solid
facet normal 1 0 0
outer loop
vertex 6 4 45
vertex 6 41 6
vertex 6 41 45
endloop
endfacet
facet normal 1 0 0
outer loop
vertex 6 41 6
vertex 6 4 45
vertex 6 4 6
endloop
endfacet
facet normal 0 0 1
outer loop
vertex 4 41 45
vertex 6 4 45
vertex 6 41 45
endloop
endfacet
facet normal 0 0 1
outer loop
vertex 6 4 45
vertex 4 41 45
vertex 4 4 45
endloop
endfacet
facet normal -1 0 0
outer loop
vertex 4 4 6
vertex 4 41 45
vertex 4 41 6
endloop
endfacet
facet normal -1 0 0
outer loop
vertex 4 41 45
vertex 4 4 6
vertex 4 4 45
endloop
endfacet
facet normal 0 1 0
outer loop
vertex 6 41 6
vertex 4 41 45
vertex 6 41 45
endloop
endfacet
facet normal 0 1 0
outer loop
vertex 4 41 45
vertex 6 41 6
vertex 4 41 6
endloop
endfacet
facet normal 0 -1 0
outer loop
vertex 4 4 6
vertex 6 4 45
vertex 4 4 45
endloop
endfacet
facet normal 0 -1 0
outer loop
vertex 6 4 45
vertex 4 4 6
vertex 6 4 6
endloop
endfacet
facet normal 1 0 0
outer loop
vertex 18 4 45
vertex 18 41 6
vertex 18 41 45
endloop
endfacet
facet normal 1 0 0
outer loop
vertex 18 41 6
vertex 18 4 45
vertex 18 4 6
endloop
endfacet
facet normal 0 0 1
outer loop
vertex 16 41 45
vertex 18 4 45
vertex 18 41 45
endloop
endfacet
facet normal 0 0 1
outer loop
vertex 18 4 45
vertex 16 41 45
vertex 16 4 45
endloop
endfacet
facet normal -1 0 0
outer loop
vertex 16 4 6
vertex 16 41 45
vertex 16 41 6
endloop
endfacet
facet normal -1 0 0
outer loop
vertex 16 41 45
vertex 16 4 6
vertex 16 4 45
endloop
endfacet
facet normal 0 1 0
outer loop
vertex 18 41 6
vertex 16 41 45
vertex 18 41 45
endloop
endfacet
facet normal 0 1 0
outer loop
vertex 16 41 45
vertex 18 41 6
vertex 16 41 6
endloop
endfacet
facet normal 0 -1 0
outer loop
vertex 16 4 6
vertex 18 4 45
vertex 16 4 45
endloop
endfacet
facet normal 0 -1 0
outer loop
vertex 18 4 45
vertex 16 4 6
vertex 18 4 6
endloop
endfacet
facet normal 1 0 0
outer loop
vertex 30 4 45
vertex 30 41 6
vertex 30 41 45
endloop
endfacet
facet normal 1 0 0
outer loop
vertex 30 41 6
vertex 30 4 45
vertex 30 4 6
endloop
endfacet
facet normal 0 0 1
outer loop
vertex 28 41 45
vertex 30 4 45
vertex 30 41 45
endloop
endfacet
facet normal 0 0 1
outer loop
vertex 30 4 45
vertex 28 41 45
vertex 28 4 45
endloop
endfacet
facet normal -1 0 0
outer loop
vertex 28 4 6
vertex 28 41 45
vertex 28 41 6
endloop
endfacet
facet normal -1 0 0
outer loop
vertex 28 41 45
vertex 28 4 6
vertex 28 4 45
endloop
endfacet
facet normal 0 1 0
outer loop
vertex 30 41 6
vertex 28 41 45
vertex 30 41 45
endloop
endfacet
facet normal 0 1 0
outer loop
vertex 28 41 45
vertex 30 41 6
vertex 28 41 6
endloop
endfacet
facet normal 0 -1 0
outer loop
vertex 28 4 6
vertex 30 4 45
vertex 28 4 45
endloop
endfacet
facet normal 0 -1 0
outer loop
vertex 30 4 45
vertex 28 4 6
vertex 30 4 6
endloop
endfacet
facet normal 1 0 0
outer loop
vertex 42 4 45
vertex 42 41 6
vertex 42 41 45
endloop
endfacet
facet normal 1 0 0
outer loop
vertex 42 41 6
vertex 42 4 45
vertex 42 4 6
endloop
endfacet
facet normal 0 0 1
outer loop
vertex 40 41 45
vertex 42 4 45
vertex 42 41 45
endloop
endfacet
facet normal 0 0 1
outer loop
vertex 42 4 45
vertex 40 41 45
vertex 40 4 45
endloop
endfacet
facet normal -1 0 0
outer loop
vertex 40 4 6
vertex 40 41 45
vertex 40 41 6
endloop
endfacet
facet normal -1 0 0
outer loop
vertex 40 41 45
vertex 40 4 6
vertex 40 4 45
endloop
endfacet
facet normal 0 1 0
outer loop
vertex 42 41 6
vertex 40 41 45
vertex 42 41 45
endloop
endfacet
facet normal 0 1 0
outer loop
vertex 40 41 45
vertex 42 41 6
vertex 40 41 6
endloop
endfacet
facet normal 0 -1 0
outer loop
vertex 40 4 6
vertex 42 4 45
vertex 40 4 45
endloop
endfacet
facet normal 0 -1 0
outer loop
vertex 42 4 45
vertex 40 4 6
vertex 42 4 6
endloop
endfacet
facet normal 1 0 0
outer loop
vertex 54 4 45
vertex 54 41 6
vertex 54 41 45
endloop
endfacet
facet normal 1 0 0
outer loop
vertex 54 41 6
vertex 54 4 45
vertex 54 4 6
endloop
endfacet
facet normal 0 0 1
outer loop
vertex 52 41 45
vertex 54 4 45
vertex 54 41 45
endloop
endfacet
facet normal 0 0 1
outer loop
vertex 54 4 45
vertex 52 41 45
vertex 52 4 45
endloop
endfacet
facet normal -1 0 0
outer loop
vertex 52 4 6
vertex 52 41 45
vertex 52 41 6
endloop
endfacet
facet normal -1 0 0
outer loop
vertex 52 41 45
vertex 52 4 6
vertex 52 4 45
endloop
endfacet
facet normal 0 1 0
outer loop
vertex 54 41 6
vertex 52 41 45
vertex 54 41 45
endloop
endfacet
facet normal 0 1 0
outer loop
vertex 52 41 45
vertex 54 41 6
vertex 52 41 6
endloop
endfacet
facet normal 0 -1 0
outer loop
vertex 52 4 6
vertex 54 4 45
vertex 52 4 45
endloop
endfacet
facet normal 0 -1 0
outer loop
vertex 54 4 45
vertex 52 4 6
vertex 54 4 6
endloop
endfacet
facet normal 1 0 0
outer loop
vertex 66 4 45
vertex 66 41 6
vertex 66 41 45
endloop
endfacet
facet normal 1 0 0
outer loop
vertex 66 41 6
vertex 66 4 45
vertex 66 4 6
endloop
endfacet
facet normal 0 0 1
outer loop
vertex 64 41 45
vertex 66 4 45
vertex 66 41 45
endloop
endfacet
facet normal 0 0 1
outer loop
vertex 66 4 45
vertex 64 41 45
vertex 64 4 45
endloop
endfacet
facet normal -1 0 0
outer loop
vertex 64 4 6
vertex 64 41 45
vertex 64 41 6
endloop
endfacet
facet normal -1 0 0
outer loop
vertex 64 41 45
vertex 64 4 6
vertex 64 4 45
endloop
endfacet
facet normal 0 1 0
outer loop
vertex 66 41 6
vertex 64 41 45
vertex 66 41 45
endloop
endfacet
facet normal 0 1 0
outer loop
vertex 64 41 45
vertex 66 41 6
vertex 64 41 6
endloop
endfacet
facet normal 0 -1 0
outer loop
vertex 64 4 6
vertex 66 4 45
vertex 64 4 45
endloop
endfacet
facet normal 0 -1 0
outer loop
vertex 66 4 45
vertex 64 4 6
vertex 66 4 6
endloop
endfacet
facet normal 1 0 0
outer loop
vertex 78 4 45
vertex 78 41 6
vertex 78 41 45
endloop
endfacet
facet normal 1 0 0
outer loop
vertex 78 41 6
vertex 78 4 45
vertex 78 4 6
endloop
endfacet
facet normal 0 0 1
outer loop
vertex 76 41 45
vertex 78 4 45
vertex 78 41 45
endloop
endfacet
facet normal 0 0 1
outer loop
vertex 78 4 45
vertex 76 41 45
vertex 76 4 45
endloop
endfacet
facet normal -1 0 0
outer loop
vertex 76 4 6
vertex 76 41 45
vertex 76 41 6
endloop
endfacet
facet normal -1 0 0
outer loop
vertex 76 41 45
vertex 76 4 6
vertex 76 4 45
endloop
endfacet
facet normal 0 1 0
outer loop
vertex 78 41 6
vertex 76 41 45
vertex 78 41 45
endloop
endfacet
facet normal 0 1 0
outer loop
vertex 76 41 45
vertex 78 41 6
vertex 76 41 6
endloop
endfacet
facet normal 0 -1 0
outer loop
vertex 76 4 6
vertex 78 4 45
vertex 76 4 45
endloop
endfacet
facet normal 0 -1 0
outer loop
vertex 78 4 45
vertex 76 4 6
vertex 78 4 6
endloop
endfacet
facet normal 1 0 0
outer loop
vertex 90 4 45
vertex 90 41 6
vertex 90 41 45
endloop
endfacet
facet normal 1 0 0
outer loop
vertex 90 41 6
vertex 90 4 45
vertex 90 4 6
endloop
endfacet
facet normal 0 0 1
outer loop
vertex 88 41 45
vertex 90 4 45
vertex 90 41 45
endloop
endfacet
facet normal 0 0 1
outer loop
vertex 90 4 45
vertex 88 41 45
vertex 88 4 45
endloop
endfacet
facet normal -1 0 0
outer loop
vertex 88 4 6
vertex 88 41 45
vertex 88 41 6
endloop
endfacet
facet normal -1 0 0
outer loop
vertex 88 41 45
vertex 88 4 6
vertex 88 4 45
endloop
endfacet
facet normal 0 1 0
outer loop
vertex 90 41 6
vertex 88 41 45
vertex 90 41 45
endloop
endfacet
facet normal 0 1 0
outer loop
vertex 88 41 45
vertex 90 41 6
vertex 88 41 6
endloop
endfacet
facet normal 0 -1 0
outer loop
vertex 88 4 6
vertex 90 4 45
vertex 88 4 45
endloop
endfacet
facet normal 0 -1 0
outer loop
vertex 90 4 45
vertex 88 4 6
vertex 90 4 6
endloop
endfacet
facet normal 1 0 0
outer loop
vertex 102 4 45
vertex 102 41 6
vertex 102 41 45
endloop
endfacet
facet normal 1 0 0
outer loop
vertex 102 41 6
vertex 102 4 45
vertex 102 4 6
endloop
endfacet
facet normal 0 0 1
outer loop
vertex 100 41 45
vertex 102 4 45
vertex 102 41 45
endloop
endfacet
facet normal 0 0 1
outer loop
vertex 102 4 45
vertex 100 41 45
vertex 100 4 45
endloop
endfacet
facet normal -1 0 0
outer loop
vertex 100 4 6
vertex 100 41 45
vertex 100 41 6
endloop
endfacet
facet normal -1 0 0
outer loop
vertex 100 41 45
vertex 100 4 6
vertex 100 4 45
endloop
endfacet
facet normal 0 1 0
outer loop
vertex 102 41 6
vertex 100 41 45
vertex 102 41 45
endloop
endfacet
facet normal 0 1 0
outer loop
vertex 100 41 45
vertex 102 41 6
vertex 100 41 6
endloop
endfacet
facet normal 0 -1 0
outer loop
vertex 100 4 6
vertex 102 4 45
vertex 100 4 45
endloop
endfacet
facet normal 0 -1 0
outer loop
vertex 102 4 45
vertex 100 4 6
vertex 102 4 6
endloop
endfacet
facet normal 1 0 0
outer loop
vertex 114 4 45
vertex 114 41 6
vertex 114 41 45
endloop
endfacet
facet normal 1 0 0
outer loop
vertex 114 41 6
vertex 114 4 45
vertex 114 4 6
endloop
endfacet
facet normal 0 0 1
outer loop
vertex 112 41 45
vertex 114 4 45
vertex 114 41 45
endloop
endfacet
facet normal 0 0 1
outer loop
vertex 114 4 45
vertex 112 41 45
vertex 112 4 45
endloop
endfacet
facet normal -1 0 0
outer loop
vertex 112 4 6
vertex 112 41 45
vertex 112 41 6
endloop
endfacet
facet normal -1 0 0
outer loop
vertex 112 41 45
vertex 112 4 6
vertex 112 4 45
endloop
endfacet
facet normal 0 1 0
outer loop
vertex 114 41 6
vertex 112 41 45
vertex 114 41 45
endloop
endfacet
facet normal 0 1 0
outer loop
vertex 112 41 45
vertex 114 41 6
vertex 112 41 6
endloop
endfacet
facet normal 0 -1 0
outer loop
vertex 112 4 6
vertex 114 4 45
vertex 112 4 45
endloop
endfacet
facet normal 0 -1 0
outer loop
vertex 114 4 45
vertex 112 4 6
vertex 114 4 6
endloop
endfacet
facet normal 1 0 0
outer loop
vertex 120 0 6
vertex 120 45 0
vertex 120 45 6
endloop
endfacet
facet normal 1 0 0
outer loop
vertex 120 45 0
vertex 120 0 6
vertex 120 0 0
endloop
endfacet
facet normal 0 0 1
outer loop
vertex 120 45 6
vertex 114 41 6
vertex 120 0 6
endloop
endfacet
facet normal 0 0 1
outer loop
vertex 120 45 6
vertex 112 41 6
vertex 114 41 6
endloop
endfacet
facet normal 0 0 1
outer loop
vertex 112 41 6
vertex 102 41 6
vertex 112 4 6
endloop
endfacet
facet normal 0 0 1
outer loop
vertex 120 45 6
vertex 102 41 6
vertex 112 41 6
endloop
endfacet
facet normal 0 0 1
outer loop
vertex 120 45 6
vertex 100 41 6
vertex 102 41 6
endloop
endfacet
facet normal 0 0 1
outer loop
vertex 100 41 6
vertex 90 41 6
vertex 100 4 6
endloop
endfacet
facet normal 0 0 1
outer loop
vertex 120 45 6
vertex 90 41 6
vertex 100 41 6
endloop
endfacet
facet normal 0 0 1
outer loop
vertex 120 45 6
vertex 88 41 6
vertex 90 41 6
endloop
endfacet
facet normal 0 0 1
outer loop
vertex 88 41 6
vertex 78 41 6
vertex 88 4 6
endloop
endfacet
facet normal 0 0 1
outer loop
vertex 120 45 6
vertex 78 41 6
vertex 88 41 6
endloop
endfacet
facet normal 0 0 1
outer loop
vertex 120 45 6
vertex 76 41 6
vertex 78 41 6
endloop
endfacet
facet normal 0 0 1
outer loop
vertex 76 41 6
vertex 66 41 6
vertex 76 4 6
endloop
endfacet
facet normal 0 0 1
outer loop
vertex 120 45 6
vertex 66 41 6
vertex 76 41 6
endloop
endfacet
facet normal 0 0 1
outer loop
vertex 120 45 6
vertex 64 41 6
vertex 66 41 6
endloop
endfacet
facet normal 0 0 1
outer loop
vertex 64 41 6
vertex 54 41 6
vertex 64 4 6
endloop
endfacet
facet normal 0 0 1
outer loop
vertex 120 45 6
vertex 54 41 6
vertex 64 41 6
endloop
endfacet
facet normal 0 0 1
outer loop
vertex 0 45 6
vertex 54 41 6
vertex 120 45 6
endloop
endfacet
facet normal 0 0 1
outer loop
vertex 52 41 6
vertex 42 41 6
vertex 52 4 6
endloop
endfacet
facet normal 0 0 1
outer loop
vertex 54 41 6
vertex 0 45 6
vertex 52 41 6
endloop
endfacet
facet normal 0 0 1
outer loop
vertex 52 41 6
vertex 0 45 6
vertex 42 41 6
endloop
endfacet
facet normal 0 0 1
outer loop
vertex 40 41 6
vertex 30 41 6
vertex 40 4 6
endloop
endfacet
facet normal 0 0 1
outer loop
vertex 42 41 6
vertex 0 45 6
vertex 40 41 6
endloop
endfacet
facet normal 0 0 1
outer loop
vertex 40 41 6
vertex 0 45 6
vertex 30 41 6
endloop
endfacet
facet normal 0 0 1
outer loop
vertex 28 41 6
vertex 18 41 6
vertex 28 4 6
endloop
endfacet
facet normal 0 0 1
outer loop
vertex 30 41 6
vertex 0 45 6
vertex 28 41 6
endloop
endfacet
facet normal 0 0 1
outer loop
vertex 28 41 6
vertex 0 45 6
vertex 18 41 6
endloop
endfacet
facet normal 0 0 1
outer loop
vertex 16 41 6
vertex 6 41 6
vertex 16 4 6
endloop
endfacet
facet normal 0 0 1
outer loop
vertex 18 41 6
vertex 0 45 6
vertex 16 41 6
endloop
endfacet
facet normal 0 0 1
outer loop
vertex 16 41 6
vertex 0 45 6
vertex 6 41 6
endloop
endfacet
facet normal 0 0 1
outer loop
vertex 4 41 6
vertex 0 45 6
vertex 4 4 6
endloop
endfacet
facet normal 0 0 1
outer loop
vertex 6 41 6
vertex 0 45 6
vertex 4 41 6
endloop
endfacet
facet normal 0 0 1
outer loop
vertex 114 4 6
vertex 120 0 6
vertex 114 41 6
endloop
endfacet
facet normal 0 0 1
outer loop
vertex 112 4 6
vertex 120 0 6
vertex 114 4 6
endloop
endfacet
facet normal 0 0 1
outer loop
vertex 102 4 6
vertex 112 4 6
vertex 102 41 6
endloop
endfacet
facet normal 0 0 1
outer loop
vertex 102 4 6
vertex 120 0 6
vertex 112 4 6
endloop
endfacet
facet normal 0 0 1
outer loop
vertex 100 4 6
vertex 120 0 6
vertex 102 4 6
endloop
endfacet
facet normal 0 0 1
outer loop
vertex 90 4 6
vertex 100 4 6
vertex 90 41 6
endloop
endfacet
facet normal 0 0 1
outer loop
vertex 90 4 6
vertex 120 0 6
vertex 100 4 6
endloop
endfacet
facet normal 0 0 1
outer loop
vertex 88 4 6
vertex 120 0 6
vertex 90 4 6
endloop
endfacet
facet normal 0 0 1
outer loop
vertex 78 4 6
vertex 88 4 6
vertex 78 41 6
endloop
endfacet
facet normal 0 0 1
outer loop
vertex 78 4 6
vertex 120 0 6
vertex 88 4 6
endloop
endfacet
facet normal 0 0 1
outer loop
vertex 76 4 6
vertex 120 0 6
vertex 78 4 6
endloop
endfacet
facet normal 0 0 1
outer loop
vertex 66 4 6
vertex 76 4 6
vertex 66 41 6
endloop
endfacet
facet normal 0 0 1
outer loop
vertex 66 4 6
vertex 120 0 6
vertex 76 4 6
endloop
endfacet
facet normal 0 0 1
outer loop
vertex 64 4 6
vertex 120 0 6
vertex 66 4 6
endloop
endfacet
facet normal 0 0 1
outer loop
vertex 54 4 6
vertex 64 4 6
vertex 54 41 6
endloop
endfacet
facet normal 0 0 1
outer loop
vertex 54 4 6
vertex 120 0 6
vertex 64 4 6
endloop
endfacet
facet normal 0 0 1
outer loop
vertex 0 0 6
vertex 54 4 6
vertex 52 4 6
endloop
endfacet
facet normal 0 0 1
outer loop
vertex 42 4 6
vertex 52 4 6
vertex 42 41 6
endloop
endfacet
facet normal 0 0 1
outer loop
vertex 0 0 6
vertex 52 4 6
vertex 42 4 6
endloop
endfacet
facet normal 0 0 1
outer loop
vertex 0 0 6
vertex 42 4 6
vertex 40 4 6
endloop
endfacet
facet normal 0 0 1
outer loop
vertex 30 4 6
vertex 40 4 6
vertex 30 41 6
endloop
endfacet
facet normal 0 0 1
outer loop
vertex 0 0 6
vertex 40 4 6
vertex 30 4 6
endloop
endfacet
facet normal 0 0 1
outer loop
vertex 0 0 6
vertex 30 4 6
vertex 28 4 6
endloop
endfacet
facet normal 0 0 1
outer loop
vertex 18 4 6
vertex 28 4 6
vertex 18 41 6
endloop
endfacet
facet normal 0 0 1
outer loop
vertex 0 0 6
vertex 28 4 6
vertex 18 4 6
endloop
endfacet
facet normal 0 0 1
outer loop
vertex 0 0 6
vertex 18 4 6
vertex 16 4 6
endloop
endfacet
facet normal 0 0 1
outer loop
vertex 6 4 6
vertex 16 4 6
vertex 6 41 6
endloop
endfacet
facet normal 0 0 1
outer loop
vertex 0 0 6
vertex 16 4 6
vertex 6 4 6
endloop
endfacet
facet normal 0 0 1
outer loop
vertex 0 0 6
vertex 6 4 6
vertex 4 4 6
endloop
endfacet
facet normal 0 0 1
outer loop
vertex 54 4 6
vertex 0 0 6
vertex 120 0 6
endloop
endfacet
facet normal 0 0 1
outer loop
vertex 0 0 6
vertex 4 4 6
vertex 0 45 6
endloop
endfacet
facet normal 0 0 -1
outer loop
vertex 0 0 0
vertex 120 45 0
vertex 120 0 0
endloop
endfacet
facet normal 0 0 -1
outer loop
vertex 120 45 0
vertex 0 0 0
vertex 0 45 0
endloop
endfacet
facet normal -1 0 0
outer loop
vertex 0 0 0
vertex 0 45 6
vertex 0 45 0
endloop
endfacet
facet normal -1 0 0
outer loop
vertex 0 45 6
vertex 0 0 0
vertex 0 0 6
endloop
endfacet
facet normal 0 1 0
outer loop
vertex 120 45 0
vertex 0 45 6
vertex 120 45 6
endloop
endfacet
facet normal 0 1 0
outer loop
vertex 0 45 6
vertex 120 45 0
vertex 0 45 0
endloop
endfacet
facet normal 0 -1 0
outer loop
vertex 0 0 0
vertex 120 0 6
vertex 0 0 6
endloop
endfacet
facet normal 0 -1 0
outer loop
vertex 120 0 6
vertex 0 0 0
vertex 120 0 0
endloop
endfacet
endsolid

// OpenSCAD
$fn = 32;

// ----------------------------------------------------------------------
// Heatsink: uniform fin block
// ----------------------------------------------------------------------

// --- parameters (mm) ---
base_l = 120;             // base length, X
base_w = 45;              // base width, Y
base_t = 6;               // base plate thickness
fin_h = 40;               // fin height above the base
fin_t = 2;                // fin thickness
edge = 4;                 // margin from the base ends
pitch = 12;               // fin pitch
fit_tol = 0.02;           // tolerance for press fits, mm
free_tol = 0.2;           // tolerance for clearance fits, mm

n_fins = floor((base_l - 2 * edge - fin_t) / pitch) + 1;  // fin count
total_h = base_t + fin_h - 1;  // overall height

union() {
  cube([base_l, base_w, base_t]);
  for (i = [0 : n_fins - 1])
    translate([edge + i * pitch, edge, base_t - 1])
      cube([fin_t, base_w - 2 * edge, fin_h]);
}
